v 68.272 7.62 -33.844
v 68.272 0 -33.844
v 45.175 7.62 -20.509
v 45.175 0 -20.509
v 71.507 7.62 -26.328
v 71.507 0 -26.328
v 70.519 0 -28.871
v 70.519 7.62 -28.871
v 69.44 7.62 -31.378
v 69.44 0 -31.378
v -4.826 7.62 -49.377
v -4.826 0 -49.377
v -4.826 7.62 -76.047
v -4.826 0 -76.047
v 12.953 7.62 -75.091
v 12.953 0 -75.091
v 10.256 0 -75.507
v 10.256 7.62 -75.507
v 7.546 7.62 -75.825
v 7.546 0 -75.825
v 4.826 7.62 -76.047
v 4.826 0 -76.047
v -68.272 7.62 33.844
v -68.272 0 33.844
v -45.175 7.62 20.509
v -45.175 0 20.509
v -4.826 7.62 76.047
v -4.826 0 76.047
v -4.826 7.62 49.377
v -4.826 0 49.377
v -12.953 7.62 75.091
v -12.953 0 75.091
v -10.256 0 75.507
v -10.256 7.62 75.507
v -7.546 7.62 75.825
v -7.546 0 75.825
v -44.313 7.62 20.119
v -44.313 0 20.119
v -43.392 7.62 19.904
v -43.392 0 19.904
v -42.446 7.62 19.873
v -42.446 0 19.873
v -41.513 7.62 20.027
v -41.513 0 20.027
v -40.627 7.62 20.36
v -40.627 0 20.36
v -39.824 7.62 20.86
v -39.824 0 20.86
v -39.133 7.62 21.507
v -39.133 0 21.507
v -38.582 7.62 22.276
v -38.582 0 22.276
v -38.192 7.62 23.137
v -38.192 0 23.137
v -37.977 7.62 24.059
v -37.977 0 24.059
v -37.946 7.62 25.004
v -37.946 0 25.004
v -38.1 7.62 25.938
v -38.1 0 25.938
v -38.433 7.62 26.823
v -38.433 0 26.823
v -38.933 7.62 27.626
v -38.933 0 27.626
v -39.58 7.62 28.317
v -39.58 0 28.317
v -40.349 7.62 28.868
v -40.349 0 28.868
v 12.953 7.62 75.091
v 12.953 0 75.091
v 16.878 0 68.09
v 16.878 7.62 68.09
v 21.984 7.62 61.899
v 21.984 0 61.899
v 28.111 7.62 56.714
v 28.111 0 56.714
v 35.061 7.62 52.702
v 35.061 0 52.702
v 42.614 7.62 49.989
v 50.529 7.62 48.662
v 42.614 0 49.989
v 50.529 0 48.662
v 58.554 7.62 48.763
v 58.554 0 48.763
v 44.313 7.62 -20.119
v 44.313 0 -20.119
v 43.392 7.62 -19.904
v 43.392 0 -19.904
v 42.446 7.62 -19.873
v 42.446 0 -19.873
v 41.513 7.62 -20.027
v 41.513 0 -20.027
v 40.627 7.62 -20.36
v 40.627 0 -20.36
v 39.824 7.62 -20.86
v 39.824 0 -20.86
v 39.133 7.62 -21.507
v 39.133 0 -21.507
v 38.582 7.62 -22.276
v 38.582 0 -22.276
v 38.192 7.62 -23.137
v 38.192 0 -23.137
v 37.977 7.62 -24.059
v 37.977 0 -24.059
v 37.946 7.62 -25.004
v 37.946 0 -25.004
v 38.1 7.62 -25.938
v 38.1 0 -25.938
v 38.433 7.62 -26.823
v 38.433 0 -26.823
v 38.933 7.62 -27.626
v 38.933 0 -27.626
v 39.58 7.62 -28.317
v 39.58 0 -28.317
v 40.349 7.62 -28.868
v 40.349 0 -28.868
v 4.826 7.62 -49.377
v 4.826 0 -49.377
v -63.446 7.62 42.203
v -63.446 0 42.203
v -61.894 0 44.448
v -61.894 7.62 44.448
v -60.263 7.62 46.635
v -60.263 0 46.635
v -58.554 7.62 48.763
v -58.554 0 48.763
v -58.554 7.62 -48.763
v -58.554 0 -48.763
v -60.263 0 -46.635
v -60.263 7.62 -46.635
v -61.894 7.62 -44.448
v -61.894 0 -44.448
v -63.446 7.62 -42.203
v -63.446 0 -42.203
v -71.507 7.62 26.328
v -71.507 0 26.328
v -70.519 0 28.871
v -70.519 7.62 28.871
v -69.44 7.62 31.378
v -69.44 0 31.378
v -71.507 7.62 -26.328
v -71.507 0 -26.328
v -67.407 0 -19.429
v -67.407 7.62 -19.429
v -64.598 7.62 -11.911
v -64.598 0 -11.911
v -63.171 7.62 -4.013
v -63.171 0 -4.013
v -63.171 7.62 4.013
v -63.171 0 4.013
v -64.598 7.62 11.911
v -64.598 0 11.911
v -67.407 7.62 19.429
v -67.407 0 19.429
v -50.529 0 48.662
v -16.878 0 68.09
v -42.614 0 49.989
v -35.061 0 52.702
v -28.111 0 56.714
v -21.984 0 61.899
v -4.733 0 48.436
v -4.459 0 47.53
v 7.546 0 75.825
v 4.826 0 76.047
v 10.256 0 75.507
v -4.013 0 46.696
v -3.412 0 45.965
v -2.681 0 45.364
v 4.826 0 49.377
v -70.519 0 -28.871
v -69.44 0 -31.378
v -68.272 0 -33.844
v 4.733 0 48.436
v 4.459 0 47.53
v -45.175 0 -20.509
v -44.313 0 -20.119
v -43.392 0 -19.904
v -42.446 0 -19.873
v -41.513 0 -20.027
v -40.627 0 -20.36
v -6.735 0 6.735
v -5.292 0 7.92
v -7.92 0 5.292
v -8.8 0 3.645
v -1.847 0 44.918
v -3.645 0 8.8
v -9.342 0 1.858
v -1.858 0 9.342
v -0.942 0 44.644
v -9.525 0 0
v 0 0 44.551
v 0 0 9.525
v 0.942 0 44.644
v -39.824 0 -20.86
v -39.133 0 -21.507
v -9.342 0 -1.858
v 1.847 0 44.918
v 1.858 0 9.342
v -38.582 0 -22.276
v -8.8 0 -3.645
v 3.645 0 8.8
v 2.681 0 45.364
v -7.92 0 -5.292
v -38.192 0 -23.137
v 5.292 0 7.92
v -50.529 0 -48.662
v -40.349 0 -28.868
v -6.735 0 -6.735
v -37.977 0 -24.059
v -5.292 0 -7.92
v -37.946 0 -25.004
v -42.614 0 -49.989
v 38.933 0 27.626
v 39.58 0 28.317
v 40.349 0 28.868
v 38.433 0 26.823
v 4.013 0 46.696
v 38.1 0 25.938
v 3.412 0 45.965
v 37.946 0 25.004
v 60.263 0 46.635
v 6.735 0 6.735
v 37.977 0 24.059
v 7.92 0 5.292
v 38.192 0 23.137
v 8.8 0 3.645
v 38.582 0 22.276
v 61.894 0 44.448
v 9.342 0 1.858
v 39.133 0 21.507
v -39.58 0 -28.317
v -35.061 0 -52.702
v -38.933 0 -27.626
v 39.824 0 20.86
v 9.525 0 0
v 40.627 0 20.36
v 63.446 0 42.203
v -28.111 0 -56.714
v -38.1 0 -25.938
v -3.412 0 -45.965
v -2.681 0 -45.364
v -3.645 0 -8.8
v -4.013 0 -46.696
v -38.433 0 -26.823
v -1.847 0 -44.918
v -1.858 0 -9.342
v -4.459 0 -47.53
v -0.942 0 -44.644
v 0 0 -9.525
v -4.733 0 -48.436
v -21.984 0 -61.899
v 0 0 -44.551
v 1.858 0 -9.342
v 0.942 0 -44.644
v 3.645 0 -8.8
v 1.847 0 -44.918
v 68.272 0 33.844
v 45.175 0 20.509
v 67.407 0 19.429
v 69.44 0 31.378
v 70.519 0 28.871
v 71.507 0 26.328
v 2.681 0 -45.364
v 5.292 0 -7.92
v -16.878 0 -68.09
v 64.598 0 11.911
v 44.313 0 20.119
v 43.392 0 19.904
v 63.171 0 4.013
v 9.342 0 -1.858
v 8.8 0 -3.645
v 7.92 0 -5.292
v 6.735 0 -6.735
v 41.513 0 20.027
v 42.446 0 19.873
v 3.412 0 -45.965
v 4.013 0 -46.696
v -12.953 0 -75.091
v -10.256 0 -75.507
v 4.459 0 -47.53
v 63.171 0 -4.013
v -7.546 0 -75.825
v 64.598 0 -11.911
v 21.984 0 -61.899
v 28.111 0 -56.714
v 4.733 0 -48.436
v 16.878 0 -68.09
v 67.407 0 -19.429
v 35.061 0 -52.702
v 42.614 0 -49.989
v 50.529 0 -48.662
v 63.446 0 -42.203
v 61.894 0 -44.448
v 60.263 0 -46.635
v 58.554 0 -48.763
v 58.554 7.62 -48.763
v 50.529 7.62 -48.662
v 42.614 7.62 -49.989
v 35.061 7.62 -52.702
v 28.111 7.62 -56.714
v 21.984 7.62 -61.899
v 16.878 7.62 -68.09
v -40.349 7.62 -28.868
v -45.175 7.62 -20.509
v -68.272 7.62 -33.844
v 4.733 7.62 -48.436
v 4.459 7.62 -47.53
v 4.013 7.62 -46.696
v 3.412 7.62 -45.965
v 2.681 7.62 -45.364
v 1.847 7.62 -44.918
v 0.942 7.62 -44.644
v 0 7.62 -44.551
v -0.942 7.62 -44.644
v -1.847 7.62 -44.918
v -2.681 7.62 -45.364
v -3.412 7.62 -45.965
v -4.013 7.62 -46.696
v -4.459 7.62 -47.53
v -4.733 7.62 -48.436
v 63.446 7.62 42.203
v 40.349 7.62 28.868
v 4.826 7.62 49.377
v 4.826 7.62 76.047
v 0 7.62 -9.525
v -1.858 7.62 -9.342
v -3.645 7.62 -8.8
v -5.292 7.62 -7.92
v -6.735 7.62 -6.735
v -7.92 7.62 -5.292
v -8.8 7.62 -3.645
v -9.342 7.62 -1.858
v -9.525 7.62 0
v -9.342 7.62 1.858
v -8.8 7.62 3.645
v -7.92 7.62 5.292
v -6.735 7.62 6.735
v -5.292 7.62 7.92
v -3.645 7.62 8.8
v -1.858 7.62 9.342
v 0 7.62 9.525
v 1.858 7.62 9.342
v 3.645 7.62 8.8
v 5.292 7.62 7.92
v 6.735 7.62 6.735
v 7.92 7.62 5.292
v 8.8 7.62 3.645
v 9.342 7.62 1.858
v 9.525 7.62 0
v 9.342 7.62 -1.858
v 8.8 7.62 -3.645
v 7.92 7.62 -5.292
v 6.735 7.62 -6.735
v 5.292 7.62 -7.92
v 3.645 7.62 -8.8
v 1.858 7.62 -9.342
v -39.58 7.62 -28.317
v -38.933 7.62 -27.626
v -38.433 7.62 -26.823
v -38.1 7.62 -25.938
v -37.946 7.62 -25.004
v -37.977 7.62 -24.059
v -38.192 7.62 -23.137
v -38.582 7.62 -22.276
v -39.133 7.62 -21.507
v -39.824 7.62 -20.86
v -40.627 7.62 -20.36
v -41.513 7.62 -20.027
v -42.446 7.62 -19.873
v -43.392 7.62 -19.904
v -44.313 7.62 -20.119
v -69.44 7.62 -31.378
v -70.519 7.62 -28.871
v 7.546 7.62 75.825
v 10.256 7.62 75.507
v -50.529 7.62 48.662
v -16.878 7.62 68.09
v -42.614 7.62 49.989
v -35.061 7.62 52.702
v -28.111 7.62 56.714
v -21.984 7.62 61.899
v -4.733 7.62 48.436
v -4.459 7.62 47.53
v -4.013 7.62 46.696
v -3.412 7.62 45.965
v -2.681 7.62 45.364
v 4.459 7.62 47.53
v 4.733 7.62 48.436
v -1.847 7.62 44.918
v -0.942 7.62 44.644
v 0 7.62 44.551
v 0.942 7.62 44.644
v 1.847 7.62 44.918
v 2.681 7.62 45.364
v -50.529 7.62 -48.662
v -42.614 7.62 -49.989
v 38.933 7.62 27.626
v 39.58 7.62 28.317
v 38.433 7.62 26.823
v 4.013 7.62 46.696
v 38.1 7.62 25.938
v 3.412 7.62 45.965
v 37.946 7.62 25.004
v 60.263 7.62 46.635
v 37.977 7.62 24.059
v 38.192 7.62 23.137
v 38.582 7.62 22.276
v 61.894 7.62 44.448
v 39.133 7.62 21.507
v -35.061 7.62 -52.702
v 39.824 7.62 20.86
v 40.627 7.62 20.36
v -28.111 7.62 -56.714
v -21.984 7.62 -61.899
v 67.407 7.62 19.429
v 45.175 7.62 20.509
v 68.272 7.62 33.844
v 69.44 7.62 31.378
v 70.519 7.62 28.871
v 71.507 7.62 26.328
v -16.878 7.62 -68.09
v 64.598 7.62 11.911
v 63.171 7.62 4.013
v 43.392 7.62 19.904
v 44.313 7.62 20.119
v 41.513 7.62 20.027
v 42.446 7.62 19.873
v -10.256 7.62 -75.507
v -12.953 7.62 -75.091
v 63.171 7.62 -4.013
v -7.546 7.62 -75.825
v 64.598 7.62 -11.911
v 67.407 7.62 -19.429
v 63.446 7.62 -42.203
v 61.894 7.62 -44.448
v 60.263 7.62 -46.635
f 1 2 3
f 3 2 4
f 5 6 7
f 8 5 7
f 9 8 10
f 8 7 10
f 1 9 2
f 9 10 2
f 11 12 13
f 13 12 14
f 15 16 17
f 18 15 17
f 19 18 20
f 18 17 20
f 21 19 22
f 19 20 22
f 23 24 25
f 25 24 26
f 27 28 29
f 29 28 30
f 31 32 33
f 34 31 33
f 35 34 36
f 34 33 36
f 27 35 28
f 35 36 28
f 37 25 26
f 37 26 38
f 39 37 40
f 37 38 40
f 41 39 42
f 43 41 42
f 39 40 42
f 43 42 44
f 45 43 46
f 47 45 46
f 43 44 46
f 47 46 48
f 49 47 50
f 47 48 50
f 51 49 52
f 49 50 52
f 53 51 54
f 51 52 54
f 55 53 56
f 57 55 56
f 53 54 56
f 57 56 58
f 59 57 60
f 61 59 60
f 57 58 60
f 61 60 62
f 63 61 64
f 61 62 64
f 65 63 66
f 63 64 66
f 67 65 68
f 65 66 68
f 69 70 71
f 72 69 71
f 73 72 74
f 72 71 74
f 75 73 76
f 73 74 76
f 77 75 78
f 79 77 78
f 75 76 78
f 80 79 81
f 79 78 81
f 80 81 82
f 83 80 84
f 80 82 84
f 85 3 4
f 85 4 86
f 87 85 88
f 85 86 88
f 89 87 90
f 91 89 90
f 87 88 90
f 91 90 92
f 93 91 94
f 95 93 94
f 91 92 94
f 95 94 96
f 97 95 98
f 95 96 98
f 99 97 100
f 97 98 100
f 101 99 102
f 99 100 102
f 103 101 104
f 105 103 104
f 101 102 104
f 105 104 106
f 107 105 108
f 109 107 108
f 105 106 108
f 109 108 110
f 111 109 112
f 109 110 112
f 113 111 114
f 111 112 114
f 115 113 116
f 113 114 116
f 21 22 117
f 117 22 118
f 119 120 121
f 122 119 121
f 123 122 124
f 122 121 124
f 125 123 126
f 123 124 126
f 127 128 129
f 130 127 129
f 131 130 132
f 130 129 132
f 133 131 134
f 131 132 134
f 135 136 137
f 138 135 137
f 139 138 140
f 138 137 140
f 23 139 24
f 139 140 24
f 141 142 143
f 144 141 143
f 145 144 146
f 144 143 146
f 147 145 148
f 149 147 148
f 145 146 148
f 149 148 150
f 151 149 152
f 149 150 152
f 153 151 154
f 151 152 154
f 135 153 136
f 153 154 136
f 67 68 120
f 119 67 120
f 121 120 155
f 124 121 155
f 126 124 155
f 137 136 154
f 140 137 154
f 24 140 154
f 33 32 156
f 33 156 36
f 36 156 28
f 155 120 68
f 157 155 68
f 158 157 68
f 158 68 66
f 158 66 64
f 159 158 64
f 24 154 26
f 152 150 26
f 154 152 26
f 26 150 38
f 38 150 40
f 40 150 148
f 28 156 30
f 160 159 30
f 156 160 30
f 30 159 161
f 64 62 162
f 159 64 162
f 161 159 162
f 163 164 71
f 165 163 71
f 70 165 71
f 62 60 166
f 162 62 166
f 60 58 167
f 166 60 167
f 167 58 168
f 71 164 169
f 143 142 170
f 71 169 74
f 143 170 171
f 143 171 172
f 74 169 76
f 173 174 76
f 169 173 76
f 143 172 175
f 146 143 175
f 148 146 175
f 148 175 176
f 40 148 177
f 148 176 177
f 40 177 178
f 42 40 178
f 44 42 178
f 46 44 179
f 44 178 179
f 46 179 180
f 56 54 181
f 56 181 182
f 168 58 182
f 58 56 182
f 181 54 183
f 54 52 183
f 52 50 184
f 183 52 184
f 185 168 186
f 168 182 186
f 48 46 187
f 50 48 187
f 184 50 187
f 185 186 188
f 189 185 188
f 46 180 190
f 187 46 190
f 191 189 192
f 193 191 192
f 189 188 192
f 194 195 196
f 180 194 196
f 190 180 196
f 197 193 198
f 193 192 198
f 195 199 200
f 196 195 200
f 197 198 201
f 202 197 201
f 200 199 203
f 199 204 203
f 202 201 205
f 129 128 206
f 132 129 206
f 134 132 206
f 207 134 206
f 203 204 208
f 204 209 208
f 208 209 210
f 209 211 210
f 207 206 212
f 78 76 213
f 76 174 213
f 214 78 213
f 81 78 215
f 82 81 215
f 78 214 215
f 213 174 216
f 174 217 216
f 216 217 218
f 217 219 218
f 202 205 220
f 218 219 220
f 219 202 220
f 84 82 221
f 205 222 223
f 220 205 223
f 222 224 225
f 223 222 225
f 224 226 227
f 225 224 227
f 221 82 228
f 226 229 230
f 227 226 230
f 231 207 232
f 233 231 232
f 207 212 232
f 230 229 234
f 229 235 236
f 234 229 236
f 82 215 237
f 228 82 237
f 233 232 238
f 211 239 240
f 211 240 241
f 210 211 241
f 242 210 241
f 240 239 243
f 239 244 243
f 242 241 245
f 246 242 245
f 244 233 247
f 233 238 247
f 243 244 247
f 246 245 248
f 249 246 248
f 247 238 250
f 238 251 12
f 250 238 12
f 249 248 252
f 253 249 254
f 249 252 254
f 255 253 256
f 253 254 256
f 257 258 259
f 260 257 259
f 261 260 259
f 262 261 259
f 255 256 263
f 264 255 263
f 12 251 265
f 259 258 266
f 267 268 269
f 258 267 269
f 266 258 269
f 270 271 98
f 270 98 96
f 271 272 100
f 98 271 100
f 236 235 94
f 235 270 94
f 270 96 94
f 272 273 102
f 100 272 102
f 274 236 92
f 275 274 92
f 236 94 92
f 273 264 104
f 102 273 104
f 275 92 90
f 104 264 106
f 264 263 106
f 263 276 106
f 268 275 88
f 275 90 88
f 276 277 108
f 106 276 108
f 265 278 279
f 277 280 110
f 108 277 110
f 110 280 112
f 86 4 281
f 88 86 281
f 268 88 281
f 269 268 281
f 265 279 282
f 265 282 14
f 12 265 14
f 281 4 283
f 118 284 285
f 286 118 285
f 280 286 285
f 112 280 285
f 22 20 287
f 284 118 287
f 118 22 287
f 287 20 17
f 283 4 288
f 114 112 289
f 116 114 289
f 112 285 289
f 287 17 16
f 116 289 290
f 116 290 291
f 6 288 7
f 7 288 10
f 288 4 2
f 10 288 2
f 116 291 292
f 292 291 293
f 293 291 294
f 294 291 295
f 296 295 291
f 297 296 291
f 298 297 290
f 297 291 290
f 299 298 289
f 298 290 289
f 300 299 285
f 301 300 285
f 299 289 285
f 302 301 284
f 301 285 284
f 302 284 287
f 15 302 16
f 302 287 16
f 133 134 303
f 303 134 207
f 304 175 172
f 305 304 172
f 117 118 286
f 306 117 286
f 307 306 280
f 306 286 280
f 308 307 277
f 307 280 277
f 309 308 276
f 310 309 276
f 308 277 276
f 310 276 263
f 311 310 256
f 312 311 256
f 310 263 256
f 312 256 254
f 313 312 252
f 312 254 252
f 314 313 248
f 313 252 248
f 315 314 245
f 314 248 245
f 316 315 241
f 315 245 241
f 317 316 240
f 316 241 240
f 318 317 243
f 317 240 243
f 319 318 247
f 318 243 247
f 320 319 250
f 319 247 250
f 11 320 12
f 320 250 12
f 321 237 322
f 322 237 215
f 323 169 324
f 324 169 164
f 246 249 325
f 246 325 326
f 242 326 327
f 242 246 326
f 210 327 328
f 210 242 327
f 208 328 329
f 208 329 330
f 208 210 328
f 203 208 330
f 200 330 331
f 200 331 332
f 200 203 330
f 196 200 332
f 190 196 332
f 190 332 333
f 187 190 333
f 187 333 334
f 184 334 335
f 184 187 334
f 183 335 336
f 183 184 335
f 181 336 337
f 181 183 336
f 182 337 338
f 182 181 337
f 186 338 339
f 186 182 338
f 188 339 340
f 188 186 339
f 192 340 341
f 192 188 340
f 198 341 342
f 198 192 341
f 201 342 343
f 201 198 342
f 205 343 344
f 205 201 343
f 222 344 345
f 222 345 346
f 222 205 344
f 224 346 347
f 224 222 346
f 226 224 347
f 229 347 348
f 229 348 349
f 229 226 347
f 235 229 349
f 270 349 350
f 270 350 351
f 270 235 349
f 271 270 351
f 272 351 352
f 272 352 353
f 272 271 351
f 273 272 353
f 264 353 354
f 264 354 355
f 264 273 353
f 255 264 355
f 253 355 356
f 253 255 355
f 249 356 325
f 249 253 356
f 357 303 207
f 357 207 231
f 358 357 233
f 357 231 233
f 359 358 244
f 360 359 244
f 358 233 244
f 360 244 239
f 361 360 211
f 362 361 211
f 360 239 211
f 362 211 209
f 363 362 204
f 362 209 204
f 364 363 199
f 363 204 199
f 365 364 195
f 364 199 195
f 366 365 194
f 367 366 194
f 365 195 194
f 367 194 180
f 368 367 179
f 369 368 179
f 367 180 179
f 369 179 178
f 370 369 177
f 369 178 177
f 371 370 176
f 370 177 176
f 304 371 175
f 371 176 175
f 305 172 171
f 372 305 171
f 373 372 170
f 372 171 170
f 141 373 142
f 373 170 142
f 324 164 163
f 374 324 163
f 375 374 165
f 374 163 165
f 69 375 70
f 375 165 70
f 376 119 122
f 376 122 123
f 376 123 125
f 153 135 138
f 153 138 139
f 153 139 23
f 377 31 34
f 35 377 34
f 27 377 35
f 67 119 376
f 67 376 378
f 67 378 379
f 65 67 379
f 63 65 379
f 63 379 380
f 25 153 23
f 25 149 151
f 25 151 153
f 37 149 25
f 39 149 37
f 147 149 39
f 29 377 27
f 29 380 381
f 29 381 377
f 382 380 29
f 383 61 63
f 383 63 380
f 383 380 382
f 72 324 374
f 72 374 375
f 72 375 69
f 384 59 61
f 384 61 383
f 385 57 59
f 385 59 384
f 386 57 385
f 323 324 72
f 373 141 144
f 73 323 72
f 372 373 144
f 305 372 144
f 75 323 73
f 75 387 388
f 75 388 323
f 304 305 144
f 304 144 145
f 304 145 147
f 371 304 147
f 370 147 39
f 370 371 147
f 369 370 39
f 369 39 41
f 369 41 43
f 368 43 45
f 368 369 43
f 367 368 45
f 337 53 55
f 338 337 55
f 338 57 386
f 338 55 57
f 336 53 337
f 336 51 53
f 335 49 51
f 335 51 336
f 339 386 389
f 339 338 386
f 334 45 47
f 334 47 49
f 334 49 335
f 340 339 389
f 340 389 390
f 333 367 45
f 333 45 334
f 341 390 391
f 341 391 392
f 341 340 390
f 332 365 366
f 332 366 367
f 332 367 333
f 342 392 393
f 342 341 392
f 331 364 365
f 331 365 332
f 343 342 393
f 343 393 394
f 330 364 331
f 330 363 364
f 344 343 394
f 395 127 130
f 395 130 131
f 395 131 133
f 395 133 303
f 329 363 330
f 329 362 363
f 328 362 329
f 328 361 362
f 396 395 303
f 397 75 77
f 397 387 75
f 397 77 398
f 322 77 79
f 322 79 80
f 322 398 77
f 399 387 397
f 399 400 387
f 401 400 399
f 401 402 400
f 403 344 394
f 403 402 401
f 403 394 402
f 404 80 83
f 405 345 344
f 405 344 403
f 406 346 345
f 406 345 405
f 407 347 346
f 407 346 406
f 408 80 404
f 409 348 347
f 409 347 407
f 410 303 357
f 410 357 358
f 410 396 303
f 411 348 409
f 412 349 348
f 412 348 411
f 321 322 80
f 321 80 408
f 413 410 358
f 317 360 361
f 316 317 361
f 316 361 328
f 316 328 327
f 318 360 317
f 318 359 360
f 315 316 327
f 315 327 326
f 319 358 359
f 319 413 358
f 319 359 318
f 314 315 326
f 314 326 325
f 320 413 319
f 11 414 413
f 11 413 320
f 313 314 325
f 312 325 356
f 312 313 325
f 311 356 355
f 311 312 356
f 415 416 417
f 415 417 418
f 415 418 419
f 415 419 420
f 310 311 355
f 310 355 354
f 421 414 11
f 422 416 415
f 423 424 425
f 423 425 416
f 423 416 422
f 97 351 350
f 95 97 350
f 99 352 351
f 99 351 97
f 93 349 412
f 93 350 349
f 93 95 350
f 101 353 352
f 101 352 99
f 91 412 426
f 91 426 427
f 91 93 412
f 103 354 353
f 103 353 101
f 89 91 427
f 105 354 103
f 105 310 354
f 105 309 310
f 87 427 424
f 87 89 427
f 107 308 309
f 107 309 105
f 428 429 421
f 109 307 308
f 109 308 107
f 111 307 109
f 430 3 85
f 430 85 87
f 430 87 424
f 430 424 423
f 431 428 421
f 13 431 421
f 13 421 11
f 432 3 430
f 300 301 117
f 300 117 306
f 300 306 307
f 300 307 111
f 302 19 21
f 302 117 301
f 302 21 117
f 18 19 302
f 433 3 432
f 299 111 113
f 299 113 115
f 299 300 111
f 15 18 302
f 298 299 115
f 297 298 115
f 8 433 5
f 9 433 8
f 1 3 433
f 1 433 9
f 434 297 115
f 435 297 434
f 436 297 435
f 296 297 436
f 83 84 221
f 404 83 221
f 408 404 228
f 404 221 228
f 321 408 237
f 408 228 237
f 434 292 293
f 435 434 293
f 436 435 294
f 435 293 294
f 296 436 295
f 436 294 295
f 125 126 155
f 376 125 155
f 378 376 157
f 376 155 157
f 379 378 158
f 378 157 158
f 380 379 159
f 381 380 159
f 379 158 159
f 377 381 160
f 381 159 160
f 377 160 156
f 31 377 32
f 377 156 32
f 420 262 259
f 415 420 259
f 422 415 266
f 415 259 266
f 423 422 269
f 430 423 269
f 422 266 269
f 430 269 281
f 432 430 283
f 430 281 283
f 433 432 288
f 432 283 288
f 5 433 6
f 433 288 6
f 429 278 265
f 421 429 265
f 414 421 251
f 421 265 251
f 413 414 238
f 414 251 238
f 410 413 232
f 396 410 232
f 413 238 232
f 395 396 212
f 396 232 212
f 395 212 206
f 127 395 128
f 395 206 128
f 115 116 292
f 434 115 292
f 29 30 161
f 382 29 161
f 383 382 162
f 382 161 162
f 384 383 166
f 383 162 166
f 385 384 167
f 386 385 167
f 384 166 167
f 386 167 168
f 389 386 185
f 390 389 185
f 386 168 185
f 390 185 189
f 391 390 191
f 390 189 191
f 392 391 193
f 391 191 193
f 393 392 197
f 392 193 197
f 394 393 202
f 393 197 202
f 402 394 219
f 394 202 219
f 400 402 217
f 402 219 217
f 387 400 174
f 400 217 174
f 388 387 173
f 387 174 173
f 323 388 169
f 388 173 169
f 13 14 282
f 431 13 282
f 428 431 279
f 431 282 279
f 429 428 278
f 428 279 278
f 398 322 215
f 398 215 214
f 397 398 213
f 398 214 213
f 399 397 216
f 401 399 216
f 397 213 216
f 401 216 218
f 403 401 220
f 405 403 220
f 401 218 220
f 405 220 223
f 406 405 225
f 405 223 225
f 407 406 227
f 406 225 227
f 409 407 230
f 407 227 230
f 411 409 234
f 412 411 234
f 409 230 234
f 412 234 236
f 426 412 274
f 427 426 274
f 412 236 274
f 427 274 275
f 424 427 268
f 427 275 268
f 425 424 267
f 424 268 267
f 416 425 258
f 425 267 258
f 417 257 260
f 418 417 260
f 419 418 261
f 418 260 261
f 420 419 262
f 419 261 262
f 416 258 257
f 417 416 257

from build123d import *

# Parameters (mm, degrees)
SKETCH1_R           = 9.525
BOSS_EXTRUDE1_DEPTH = 7.62


with BuildPart() as part:
    # Sketch1 → Boss-Extrude1 (new body)
    with BuildSketch(Plane(origin=(0, 0, 0), x_dir=(1, 0, 0), z_dir=(0, 1, 0))):
        with BuildLine():
            Line((-4.826, 49.377023111), (-4.826, 76.047023111))
            ThreePointArc((-4.826, 76.047023111), (-8.902418576, 75.678180102), (-12.953151139, 75.090983983))
            ThreePointArc((-12.953151139, 75.090983983), (-31.496, 54.552672235), (-58.554124155, 48.763249937))
            ThreePointArc((-58.554124155, 48.763249937), (-61.088017192, 45.548810693), (-63.445653896, 42.202950154))
            Line((-63.445653896, 42.202950154), (-40.348756377, 28.867950154))
            ThreePointArc((-40.348756377, 28.867950154), (-38.582317778, 22.275511555), (-45.174756377, 20.509072957))
            Line((-45.174756377, 20.509072957), (-68.271653896, 33.844072957))
            ThreePointArc((-68.271653896, 33.844072957), (-69.990435768, 30.129369409), (-71.507275294, 26.327734046))
            ThreePointArc((-71.507275294, 26.327734046), (-62.992, 0), (-71.507275294, -26.327734046))
            ThreePointArc((-71.507275294, -26.327734046), (-69.990435768, -30.129369409), (-68.271653896, -33.844072957))
            Line((-68.271653896, -33.844072957), (-45.174756377, -20.509072957))
            ThreePointArc((-45.174756377, -20.509072957), (-38.582317778, -22.275511555), (-40.348756377, -28.867950154))
            Line((-40.348756377, -28.867950154), (-63.445653896, -42.202950154))
            ThreePointArc((-63.445653896, -42.202950154), (-61.088017192, -45.548810693), (-58.554124155, -48.763249937))
            ThreePointArc((-58.554124155, -48.763249937), (-31.496, -54.552672235), (-12.953151139, -75.090983983))
            ThreePointArc((-12.953151139, -75.090983983), (-8.902418576, -75.678180102), (-4.826, -76.047023111))
            Line((-4.826, -76.047023111), (-4.826, -49.377023111))
            ThreePointArc((-4.826, -49.377023111), (0, -44.551023111), (4.826, -49.377023111))
            Line((4.826, -49.377023111), (4.826, -76.047023111))
            ThreePointArc((4.826, -76.047023111), (8.902418576, -75.678180102), (12.953151139, -75.090983983))
            ThreePointArc((12.953151139, -75.090983983), (31.496, -54.552672235), (58.554124155, -48.763249937))
            ThreePointArc((58.554124155, -48.763249937), (61.088017192, -45.548810693), (63.445653896, -42.202950154))
            Line((63.445653896, -42.202950154), (40.348756377, -28.867950154))
            ThreePointArc((40.348756377, -28.867950154), (38.582317778, -22.275511555), (45.174756377, -20.509072957))
            Line((45.174756377, -20.509072957), (68.271653896, -33.844072957))
            ThreePointArc((68.271653896, -33.844072957), (69.990435768, -30.129369409), (71.507275294, -26.327734046))
            ThreePointArc((71.507275294, -26.327734046), (62.992, 0), (71.507275294, 26.327734046))
            ThreePointArc((71.507275294, 26.327734046), (69.990435768, 30.129369409), (68.271653896, 33.844072957))
            Line((68.271653896, 33.844072957), (45.174756377, 20.509072957))
            ThreePointArc((45.174756377, 20.509072957), (38.582317778, 22.275511555), (40.348756377, 28.867950154))
            Line((40.348756377, 28.867950154), (63.445653896, 42.202950154))
            ThreePointArc((63.445653896, 42.202950154), (61.088017192, 45.548810693), (58.554124155, 48.763249937))
            ThreePointArc((58.554124155, 48.763249937), (31.496, 54.552672235), (12.953151139, 75.090983983))
            ThreePointArc((12.953151139, 75.090983983), (8.902418576, 75.678180102), (4.826, 76.047023111))
            Line((4.826, 76.047023111), (4.826, 49.377023111))
            ThreePointArc((4.826, 49.377023111), (0, 44.551023111), (-4.826, 49.377023111))
        make_face()
        with Locations(Location((0, 0, 0), (0, 0, 90))):
            Circle(SKETCH1_R, mode=Mode.SUBTRACT)
    extrude(amount=BOSS_EXTRUDE1_DEPTH)


solid = part.part
